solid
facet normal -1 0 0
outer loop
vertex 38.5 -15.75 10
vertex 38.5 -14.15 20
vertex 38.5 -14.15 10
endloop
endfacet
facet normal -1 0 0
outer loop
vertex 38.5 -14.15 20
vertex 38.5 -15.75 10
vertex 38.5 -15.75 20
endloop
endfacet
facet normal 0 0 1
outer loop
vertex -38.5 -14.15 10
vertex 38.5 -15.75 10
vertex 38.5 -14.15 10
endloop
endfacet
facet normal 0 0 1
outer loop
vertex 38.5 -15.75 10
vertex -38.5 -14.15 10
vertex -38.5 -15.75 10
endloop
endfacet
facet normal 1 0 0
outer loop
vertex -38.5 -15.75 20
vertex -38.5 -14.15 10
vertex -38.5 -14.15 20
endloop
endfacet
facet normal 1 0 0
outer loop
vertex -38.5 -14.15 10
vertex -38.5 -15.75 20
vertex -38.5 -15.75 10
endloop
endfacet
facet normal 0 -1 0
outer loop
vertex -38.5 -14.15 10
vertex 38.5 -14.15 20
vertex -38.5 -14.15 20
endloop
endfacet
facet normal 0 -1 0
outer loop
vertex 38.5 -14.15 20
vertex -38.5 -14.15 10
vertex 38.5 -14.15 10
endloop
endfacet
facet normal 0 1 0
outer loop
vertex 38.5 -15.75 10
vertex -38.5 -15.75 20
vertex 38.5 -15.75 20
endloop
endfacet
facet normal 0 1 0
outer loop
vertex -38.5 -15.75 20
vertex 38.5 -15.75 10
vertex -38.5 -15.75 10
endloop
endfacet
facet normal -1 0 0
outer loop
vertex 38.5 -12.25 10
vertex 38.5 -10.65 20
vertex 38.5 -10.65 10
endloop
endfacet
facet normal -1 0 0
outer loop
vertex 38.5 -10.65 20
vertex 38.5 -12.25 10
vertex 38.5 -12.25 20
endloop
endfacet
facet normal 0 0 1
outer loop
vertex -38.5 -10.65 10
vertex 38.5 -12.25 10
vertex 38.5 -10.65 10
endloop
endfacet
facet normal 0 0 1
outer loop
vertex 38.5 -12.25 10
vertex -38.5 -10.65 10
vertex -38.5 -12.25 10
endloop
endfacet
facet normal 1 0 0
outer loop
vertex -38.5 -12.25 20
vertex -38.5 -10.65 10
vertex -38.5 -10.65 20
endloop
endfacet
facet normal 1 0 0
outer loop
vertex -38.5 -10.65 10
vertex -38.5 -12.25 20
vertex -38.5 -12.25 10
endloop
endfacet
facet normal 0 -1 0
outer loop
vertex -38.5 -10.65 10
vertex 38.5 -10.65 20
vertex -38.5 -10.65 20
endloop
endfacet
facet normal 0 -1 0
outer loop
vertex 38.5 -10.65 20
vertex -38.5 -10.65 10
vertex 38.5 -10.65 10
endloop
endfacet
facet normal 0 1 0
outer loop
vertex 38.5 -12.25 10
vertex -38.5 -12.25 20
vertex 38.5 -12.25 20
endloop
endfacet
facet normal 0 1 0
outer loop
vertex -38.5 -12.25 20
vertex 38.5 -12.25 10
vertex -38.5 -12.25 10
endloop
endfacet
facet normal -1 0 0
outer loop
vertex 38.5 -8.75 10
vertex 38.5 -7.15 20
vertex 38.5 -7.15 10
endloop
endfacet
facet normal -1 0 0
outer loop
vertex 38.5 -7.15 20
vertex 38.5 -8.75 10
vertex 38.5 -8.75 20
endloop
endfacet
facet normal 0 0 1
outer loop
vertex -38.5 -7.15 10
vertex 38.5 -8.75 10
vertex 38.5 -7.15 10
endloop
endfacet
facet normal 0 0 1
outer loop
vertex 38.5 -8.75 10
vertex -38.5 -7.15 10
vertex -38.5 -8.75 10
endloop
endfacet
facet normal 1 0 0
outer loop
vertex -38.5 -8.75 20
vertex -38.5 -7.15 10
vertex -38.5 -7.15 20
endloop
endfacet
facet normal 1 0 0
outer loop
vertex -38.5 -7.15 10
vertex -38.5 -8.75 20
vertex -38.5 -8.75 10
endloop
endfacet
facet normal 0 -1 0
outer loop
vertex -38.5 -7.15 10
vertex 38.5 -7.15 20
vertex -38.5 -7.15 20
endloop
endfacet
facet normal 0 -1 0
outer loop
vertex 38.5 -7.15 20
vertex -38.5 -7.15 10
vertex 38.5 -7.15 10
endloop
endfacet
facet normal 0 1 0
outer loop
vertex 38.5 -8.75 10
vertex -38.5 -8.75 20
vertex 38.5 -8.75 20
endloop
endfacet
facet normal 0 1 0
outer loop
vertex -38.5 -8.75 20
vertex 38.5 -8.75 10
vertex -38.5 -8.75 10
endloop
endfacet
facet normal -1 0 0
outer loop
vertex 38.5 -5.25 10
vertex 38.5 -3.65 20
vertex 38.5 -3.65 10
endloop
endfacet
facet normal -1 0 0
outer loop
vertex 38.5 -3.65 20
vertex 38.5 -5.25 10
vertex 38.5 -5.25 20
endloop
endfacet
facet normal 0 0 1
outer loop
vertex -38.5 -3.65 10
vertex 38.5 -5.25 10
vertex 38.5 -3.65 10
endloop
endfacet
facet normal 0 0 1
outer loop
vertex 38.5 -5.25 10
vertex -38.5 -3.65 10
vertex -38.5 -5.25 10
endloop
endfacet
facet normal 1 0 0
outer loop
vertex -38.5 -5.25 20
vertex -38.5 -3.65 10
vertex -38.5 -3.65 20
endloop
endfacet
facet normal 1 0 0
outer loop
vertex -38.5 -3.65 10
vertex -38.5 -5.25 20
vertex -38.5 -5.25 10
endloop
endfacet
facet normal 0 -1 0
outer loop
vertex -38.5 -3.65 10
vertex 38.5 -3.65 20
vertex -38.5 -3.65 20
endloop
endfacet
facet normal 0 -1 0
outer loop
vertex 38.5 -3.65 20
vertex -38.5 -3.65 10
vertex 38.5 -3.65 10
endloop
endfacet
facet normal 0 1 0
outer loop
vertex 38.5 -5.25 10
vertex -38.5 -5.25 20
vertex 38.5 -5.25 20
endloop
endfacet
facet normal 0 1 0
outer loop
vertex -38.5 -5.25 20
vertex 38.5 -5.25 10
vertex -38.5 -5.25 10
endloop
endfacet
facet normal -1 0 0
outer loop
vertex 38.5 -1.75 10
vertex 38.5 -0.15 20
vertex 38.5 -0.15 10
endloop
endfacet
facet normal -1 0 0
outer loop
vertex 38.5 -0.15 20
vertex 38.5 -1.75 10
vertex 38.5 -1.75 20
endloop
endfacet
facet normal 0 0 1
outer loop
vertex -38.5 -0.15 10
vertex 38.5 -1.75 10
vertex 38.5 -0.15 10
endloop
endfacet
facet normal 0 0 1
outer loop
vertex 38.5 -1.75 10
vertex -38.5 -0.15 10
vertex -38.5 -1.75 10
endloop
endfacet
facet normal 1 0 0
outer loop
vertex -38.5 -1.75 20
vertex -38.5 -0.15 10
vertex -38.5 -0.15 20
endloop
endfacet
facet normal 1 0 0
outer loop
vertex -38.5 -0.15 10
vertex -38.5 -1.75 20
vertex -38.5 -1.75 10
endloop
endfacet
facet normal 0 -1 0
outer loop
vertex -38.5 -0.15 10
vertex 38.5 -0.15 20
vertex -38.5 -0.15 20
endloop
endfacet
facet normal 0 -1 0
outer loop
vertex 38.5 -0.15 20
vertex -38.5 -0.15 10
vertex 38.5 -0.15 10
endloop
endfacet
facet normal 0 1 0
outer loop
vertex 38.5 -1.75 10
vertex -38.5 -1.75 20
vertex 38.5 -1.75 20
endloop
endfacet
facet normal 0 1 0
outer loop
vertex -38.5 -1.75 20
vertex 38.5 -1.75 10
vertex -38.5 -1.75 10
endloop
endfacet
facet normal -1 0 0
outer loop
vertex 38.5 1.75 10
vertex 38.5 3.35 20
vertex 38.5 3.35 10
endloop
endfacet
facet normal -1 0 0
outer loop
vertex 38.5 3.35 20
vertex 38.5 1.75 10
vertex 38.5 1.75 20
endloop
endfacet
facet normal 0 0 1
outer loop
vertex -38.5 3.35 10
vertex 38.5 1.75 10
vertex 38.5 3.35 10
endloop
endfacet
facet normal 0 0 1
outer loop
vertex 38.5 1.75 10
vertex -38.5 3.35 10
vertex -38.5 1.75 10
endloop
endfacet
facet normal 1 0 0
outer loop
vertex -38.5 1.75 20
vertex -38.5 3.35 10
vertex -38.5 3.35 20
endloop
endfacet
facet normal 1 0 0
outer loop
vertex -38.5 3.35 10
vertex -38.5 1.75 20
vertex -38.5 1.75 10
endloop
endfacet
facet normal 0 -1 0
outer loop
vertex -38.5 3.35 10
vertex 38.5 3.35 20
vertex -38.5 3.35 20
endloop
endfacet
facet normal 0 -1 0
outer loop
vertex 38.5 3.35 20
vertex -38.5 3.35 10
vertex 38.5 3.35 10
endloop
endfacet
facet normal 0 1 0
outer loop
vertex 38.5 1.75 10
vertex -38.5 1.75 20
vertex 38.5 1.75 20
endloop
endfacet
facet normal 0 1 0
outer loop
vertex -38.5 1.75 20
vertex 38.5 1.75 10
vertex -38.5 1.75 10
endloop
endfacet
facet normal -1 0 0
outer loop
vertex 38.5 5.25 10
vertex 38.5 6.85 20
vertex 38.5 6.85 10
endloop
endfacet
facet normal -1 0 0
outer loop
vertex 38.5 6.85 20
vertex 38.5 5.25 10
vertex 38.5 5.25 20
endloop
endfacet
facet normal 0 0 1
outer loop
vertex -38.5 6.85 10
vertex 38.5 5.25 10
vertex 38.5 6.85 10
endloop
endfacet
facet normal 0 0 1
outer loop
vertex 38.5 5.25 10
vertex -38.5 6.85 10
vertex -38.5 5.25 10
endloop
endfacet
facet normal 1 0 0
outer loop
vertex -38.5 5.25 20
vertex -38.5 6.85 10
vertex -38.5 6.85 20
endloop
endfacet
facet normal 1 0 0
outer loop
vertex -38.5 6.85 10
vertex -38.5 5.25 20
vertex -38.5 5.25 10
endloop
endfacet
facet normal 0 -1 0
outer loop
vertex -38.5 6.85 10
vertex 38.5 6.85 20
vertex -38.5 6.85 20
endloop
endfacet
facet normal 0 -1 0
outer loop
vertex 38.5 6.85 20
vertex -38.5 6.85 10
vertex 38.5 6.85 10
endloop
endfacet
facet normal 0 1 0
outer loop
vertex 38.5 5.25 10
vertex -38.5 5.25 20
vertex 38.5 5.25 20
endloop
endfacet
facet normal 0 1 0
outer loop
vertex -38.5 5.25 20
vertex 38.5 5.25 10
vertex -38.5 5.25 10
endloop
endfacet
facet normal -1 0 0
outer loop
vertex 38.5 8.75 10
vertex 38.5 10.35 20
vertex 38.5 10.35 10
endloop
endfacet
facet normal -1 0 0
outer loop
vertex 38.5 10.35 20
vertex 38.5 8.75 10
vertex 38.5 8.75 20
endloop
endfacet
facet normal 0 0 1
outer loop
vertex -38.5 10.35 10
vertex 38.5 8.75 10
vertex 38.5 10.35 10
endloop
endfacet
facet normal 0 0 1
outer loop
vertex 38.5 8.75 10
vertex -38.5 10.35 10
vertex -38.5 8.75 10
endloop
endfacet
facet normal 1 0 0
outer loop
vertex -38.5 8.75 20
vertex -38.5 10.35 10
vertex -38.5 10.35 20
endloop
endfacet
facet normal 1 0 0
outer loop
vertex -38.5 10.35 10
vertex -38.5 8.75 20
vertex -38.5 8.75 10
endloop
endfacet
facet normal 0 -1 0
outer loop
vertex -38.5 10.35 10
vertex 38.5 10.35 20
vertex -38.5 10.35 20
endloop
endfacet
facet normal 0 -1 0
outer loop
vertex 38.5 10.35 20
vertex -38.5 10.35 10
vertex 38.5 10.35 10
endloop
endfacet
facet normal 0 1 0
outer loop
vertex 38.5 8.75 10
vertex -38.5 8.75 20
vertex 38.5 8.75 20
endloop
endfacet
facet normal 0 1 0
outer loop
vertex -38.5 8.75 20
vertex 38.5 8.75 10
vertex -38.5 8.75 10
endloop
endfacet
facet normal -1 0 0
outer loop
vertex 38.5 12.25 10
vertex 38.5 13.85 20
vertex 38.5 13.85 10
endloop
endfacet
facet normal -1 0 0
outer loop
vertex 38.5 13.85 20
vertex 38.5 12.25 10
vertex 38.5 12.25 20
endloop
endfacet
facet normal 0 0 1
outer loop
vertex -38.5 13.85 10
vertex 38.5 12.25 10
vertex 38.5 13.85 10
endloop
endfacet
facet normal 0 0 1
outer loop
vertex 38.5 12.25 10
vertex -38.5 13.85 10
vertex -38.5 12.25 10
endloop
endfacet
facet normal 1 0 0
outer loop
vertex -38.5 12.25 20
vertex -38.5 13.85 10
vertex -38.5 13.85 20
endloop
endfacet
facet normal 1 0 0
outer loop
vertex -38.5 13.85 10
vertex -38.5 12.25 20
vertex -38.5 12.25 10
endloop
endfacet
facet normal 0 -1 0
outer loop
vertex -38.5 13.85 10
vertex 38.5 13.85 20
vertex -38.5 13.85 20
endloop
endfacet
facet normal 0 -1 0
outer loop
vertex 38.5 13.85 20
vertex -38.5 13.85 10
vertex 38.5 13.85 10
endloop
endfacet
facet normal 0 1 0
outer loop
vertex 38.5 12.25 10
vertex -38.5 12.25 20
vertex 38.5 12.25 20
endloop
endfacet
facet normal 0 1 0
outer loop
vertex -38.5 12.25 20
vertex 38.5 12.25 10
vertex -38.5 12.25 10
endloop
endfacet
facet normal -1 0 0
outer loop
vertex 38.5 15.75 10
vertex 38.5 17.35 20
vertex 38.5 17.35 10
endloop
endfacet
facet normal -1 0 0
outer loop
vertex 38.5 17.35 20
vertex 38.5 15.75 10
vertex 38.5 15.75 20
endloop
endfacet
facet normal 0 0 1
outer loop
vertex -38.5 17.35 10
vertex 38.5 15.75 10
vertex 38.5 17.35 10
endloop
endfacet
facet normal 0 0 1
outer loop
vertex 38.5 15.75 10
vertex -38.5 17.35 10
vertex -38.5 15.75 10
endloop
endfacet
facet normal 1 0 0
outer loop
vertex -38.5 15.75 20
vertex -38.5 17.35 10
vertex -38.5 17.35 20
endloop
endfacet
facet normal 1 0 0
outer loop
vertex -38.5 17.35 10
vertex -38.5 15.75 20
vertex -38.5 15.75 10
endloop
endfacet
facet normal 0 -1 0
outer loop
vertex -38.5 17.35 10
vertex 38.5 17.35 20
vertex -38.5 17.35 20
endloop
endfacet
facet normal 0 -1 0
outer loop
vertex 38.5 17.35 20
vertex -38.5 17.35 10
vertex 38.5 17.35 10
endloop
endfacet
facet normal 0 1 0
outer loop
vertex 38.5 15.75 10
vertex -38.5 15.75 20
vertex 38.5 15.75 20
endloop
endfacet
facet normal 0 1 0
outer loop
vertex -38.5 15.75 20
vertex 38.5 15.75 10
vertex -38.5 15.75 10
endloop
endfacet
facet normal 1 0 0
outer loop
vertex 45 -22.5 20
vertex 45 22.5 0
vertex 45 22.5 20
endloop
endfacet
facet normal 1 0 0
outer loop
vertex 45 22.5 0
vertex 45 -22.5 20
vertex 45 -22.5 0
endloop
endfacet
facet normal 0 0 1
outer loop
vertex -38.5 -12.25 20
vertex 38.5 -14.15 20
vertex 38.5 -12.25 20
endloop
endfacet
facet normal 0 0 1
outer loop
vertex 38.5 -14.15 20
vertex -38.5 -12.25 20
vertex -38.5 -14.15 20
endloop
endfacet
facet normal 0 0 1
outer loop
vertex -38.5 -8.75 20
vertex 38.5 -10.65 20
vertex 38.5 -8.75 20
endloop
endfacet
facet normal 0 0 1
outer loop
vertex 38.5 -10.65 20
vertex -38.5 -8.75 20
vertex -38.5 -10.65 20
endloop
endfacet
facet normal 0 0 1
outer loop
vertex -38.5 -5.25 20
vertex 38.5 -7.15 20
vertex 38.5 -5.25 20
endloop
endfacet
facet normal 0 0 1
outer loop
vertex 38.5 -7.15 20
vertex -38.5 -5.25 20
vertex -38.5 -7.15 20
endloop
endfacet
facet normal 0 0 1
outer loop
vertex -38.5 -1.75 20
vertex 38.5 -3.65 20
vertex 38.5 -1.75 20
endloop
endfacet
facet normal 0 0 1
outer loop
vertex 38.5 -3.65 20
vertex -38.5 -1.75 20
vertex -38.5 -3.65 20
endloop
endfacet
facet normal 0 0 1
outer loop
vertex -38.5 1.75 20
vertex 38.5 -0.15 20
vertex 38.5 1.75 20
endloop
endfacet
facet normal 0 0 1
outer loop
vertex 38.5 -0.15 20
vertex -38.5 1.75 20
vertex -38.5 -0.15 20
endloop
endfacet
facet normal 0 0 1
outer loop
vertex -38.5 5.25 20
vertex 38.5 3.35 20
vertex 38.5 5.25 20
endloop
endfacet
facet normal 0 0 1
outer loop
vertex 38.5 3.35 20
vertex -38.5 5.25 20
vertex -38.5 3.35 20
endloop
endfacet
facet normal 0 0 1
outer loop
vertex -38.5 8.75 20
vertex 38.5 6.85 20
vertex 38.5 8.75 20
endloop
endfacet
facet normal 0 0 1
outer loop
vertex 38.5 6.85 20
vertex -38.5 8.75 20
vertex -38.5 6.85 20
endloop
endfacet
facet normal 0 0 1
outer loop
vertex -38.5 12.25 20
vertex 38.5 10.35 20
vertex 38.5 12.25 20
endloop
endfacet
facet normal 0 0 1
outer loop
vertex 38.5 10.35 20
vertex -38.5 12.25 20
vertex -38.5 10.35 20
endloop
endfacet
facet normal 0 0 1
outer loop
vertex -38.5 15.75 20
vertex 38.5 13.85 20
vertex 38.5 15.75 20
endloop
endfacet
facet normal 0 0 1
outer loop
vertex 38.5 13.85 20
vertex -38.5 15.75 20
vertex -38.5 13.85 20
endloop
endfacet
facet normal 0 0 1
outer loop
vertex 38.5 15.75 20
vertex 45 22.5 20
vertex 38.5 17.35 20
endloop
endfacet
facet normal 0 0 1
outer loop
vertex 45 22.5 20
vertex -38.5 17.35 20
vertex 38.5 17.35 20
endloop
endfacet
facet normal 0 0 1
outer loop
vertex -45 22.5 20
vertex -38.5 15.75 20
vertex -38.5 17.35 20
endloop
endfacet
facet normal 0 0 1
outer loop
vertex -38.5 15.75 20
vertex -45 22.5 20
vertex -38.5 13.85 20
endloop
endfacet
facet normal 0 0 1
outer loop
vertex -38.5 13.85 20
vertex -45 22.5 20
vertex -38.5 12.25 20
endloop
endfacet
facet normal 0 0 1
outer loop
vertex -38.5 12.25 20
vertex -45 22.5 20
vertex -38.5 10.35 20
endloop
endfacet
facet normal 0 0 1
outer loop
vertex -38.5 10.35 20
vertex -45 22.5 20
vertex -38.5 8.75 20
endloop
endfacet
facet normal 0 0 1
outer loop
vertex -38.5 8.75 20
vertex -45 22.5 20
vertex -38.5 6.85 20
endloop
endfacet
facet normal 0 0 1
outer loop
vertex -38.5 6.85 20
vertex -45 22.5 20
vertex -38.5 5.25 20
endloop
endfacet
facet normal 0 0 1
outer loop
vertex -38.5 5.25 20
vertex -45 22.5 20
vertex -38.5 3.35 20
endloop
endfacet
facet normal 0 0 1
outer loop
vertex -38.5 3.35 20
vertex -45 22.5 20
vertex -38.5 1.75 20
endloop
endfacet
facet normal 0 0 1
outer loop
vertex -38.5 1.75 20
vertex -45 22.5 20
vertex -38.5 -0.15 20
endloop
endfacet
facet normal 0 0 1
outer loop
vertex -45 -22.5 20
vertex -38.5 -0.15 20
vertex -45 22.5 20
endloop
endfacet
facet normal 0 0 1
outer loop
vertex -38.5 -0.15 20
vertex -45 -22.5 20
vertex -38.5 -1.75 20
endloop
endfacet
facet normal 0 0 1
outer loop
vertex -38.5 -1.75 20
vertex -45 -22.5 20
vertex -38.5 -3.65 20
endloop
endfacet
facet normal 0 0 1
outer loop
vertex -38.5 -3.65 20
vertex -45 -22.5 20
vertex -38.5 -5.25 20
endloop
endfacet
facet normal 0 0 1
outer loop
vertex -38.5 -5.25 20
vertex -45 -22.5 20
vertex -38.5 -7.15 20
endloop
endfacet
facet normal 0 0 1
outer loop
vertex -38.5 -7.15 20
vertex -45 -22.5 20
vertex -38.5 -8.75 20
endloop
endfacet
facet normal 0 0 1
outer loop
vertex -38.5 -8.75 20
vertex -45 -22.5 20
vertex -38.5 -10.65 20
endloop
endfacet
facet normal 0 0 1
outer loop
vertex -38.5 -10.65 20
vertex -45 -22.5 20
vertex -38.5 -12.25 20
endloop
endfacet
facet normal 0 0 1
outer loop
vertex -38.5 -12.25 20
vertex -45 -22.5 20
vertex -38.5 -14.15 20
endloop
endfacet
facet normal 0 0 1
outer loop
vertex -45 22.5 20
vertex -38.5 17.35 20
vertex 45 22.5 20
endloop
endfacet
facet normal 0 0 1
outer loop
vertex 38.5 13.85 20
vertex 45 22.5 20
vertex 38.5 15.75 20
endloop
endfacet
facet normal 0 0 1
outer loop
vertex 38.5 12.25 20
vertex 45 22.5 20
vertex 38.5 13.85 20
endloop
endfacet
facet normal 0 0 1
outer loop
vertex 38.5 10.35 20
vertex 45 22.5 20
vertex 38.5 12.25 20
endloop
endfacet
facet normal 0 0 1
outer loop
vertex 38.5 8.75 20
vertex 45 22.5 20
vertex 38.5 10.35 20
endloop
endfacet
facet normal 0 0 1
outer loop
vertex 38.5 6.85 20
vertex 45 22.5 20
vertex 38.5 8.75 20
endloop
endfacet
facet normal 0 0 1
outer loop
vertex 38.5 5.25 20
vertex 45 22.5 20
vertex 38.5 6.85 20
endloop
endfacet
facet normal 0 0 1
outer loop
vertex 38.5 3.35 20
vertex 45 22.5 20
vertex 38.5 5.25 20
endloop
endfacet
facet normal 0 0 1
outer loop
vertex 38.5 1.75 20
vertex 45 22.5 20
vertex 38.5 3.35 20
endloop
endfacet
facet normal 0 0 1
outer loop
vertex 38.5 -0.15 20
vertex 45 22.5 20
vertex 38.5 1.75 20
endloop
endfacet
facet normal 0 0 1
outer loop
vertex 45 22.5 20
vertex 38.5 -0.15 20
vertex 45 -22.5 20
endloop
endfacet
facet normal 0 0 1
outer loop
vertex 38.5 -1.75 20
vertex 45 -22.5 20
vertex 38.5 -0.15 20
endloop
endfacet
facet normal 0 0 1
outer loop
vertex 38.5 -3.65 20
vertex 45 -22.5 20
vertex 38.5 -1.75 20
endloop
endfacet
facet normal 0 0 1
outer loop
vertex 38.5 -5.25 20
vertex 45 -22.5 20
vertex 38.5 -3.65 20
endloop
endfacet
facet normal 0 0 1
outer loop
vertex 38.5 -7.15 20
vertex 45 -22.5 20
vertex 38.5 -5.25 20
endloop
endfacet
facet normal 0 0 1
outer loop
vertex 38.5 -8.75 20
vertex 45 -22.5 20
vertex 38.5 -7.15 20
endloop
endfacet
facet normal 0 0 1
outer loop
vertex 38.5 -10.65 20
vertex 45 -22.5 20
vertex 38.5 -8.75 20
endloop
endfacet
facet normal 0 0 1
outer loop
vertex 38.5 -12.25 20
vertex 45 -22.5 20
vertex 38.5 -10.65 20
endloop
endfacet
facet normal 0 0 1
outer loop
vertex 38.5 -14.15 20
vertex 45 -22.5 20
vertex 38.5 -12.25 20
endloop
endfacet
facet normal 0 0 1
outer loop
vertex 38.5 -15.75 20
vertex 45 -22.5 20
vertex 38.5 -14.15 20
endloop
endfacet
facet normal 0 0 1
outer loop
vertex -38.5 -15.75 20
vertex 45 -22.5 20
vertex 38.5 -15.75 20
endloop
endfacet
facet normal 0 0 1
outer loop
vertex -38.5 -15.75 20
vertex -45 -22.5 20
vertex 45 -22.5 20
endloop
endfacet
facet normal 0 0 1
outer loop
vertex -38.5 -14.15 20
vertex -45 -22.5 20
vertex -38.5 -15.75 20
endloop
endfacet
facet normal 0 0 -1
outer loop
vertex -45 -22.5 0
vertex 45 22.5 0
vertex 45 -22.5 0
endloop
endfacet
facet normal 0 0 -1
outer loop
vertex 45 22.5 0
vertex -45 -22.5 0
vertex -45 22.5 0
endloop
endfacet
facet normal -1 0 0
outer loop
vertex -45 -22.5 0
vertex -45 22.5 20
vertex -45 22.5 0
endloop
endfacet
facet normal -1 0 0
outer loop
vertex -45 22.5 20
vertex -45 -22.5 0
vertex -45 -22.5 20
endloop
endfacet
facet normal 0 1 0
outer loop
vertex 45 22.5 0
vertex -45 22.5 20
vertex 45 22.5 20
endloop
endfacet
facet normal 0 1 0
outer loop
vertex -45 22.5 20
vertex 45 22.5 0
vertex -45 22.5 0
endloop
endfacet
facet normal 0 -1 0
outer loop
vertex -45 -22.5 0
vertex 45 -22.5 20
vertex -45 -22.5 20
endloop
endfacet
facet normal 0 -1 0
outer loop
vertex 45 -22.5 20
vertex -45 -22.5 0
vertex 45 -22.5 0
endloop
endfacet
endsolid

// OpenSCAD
// Microscope slide drying rack
// Print orientation: base block on XY plane, slots open upward (+Z)

// ---------------- Parameters ----------------
block_len    = 90;    // base block length along X (mm)
block_wid    = 45;    // base block width along Y (mm)
block_h      = 20;    // base block height along Z (mm)

slot_count   = 10;    // number of slide slots
slot_len     = 77;    // slot length along X (mm)
slot_w       = 1.6;   // slot width along Y (mm)
slot_depth   = 10;    // slot depth into block from top face (mm)
slot_pitch   = 3.5;   // centre-to-centre slot spacing along Y (mm)

eps          = 0.5;   // cutter overshoot past top face (mm)

$fn = 64;

// ---------------- Model ----------------
difference() {
    // Base block, centred in X/Y, resting on z = 0
    translate([-block_len/2, -block_wid/2, 0])
        cube([block_len, block_wid, block_h]);

    // Parallel slots running along X, centred in X and Y
    for (i = [0 : slot_count - 1]) {
        y = (i - (slot_count - 1)/2) * slot_pitch;
        translate([-slot_len/2, y, block_h - slot_depth])
            cube([slot_len, slot_w, slot_depth + eps]);
    }
}
